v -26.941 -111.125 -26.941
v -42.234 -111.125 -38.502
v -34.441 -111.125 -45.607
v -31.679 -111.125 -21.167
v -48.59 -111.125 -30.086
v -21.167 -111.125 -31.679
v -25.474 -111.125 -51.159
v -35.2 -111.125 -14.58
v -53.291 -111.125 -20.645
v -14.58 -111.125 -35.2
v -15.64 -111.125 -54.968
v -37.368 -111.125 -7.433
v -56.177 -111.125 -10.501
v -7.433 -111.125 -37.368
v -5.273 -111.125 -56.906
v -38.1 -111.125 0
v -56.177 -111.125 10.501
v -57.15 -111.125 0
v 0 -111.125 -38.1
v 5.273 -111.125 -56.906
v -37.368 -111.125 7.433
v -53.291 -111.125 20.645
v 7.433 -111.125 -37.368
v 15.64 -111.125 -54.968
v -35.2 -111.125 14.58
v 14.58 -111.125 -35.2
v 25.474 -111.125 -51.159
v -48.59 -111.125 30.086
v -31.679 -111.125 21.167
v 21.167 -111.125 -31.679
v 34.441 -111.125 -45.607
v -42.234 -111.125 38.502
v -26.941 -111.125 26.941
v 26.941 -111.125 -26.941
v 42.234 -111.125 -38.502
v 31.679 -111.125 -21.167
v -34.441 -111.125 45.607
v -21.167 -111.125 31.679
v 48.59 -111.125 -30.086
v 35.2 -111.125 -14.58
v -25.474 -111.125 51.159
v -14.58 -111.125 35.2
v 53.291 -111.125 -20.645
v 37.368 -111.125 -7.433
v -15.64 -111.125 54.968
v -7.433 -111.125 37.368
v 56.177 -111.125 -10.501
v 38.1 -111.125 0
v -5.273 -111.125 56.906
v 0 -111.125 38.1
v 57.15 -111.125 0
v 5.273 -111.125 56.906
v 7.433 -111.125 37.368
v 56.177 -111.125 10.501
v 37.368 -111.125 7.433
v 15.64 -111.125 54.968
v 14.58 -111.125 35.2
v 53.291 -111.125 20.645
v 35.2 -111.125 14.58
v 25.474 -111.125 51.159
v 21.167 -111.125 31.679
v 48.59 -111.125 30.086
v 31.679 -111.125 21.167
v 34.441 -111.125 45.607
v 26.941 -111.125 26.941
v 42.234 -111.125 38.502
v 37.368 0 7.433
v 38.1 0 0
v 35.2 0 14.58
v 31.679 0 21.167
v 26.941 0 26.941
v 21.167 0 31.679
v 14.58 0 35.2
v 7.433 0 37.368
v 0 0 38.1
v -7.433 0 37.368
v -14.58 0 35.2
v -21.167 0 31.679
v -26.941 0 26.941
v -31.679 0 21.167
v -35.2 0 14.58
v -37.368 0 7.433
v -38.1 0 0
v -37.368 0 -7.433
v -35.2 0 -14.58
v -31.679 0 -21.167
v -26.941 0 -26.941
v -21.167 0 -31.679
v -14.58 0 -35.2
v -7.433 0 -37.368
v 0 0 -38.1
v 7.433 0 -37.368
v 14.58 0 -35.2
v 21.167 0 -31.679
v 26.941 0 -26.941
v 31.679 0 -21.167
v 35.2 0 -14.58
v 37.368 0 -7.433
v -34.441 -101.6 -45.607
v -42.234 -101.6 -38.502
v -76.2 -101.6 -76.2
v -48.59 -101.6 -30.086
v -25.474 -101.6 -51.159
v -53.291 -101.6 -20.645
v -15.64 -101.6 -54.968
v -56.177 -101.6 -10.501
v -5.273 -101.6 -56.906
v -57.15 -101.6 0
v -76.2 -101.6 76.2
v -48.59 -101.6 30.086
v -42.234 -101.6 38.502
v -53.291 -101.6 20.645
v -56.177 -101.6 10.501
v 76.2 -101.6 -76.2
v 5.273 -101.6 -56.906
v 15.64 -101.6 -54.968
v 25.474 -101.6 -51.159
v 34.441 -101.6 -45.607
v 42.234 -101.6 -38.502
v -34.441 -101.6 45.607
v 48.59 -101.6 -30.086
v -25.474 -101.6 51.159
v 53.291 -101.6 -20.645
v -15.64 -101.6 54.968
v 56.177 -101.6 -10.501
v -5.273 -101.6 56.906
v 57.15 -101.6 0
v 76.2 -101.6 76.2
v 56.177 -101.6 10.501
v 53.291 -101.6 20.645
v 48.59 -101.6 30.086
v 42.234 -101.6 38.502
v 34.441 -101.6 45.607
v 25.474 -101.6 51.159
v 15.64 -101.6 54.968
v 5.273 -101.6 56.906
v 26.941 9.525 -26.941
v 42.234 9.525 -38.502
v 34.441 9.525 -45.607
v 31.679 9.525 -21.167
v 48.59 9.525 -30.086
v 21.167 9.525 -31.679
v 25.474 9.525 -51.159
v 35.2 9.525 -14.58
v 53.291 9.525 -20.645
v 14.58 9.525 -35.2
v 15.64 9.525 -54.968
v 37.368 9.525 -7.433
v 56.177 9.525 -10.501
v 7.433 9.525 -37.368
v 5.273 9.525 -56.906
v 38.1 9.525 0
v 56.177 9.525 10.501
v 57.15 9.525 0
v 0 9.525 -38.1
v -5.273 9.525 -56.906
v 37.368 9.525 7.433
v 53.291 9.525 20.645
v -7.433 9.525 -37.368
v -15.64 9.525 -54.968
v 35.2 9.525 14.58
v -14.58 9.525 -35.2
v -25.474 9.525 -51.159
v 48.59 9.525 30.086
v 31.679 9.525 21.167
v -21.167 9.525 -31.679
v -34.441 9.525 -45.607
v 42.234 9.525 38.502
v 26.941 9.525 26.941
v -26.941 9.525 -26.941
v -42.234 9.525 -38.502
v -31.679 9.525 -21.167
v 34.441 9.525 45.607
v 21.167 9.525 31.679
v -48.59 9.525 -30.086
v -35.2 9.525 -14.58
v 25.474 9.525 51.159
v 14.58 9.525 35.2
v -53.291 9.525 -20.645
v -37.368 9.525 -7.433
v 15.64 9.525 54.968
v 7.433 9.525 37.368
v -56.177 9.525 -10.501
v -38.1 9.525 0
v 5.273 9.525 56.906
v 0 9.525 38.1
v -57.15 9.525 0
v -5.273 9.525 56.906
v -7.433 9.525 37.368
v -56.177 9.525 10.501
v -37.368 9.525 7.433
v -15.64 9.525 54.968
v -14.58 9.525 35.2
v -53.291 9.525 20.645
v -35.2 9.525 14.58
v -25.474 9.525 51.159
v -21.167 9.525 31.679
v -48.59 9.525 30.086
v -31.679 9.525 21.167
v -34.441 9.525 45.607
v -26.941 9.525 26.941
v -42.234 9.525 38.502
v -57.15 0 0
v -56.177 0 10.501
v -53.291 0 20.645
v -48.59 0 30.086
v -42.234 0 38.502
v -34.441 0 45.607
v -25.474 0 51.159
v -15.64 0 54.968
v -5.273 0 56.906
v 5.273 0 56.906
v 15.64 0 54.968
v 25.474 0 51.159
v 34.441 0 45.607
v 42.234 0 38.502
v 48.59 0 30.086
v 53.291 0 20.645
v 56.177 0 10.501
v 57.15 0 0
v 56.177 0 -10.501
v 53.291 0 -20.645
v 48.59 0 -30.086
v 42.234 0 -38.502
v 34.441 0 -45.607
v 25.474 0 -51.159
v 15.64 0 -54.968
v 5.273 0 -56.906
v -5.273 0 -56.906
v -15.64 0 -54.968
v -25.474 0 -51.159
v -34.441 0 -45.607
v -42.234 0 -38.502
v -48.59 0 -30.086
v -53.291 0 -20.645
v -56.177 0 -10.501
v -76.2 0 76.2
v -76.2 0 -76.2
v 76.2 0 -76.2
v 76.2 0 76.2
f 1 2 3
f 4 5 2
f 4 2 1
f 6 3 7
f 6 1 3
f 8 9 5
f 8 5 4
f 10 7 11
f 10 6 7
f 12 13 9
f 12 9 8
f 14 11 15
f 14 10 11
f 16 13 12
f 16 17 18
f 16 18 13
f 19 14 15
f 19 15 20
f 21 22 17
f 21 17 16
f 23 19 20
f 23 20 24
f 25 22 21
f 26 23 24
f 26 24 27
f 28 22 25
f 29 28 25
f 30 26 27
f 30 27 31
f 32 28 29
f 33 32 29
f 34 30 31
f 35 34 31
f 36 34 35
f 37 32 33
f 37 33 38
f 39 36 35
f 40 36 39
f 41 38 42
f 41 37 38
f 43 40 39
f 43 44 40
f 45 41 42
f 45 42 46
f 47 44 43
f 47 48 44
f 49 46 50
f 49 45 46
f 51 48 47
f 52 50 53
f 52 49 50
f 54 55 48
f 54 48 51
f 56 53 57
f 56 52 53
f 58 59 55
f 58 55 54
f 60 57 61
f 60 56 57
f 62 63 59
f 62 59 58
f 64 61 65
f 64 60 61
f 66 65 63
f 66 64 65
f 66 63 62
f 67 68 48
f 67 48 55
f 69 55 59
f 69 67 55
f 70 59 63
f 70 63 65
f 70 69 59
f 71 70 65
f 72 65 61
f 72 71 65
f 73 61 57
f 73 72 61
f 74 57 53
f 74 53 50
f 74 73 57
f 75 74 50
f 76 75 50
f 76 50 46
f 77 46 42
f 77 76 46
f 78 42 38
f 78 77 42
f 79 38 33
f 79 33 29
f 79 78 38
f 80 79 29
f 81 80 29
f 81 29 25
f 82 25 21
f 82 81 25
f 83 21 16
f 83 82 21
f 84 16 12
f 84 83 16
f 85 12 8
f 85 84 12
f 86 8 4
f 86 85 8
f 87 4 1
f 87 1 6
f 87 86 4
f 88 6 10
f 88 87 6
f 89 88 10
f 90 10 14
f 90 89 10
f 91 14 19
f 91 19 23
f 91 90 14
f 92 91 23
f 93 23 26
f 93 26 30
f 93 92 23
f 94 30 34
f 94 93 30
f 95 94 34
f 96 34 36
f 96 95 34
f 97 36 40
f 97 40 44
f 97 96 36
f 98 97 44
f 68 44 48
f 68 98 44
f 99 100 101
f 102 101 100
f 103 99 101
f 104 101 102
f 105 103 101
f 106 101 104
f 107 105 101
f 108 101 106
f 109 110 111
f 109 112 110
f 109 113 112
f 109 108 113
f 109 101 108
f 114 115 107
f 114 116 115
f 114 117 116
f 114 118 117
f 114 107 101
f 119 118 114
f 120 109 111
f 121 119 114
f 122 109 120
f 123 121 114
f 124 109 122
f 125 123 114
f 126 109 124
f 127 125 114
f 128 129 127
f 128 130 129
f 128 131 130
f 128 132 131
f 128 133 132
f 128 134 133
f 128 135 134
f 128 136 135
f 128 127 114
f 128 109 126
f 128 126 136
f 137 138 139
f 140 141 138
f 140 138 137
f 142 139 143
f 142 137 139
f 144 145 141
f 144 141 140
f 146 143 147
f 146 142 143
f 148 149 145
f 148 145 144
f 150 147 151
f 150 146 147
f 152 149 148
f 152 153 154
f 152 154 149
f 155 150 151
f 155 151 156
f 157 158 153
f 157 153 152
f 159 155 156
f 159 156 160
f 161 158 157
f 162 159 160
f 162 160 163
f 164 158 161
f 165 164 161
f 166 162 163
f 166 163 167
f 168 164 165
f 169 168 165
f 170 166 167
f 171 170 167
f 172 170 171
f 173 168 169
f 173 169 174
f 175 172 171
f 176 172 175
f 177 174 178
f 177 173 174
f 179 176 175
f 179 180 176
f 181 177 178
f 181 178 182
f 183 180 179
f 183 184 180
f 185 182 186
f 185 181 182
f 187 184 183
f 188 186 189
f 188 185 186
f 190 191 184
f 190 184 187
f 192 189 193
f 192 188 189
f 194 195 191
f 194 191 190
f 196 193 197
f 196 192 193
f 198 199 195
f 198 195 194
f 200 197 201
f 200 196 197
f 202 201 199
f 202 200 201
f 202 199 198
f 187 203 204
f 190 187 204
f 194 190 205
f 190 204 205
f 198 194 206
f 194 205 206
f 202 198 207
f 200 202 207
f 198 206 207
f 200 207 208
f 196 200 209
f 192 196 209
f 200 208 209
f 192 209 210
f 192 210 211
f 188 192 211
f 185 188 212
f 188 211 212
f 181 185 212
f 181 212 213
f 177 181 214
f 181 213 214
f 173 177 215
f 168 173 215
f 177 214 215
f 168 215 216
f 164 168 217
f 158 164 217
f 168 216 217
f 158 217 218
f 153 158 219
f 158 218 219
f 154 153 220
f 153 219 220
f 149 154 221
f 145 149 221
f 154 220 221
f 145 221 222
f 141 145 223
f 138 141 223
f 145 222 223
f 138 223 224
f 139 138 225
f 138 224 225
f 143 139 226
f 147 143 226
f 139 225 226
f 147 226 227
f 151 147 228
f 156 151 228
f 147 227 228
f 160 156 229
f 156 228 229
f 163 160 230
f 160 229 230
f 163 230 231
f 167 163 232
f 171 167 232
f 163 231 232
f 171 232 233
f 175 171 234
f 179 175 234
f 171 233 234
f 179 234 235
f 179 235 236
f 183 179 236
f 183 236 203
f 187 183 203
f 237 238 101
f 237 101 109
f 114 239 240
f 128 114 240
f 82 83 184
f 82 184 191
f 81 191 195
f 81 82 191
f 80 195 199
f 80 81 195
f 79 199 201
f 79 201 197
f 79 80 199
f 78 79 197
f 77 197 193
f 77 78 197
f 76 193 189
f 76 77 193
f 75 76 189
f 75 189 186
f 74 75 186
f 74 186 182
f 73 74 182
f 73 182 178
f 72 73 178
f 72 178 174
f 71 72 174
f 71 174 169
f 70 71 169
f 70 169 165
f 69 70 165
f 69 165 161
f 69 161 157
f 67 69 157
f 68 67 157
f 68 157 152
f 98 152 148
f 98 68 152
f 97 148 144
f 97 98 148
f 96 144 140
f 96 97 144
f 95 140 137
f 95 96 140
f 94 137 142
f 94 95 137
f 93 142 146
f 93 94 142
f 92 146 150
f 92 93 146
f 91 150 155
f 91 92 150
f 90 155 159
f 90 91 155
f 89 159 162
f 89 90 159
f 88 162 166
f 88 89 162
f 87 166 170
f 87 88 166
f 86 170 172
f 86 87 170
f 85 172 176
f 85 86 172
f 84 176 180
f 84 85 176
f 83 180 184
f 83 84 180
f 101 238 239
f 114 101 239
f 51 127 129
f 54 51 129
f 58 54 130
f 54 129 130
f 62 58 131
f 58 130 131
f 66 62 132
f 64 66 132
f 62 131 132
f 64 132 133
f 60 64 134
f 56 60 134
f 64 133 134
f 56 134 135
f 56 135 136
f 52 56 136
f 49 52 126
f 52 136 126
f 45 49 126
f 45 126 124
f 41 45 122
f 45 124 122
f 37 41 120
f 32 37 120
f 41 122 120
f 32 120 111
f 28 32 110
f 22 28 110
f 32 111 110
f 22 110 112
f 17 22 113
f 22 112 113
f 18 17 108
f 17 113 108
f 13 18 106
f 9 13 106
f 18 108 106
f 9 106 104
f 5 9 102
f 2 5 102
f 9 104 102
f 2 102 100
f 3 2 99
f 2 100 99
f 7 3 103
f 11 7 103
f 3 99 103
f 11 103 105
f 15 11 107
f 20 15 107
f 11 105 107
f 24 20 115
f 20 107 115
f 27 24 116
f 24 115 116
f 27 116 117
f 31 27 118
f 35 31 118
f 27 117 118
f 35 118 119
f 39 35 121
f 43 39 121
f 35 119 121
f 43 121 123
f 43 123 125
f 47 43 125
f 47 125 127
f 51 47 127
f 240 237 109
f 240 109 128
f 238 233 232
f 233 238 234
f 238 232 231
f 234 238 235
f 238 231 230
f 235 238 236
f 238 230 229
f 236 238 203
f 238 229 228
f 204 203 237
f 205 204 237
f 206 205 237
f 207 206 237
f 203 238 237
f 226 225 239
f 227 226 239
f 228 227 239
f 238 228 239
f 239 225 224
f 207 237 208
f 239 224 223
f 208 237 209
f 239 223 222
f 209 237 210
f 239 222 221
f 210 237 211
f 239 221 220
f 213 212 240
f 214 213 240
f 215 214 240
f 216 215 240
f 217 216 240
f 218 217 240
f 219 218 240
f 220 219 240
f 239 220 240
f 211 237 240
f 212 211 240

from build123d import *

# Parameters (mm, degrees)
F0_W     = 152.4
F0_H     = 152.4
F0_R     = 38.1
F1_DEPTH = 101.6
F2_R     = 57.15
F2_R_2   = 38.1
F3_DEPTH = 9.525
F4_R     = 57.15
F4_R_2   = 38.1
F5_DEPTH = 9.525


with BuildPart() as f1:
    # F0 (on Front) → F1 (new body)
    with BuildSketch(Plane.XZ):
        Rectangle(F0_W, F0_H)
        Circle(F0_R, mode=Mode.SUBTRACT)
    extrude(amount=F1_DEPTH)

    # F2 (on face) → F3 (join)
    with BuildSketch(Plane.XZ.offset(101.6)):
        Circle(F2_R)
        Circle(F2_R_2, mode=Mode.SUBTRACT)
    extrude(amount=F3_DEPTH)

    # F4 (on face) → F5 (join)
    with BuildSketch(Plane(origin=(0, 0, 0), x_dir=(-1, 0, 0), z_dir=(0, 1, 0))):
        Circle(F4_R)
        Circle(F4_R_2, mode=Mode.SUBTRACT)
    extrude(amount=F5_DEPTH)


solid = f1.part
